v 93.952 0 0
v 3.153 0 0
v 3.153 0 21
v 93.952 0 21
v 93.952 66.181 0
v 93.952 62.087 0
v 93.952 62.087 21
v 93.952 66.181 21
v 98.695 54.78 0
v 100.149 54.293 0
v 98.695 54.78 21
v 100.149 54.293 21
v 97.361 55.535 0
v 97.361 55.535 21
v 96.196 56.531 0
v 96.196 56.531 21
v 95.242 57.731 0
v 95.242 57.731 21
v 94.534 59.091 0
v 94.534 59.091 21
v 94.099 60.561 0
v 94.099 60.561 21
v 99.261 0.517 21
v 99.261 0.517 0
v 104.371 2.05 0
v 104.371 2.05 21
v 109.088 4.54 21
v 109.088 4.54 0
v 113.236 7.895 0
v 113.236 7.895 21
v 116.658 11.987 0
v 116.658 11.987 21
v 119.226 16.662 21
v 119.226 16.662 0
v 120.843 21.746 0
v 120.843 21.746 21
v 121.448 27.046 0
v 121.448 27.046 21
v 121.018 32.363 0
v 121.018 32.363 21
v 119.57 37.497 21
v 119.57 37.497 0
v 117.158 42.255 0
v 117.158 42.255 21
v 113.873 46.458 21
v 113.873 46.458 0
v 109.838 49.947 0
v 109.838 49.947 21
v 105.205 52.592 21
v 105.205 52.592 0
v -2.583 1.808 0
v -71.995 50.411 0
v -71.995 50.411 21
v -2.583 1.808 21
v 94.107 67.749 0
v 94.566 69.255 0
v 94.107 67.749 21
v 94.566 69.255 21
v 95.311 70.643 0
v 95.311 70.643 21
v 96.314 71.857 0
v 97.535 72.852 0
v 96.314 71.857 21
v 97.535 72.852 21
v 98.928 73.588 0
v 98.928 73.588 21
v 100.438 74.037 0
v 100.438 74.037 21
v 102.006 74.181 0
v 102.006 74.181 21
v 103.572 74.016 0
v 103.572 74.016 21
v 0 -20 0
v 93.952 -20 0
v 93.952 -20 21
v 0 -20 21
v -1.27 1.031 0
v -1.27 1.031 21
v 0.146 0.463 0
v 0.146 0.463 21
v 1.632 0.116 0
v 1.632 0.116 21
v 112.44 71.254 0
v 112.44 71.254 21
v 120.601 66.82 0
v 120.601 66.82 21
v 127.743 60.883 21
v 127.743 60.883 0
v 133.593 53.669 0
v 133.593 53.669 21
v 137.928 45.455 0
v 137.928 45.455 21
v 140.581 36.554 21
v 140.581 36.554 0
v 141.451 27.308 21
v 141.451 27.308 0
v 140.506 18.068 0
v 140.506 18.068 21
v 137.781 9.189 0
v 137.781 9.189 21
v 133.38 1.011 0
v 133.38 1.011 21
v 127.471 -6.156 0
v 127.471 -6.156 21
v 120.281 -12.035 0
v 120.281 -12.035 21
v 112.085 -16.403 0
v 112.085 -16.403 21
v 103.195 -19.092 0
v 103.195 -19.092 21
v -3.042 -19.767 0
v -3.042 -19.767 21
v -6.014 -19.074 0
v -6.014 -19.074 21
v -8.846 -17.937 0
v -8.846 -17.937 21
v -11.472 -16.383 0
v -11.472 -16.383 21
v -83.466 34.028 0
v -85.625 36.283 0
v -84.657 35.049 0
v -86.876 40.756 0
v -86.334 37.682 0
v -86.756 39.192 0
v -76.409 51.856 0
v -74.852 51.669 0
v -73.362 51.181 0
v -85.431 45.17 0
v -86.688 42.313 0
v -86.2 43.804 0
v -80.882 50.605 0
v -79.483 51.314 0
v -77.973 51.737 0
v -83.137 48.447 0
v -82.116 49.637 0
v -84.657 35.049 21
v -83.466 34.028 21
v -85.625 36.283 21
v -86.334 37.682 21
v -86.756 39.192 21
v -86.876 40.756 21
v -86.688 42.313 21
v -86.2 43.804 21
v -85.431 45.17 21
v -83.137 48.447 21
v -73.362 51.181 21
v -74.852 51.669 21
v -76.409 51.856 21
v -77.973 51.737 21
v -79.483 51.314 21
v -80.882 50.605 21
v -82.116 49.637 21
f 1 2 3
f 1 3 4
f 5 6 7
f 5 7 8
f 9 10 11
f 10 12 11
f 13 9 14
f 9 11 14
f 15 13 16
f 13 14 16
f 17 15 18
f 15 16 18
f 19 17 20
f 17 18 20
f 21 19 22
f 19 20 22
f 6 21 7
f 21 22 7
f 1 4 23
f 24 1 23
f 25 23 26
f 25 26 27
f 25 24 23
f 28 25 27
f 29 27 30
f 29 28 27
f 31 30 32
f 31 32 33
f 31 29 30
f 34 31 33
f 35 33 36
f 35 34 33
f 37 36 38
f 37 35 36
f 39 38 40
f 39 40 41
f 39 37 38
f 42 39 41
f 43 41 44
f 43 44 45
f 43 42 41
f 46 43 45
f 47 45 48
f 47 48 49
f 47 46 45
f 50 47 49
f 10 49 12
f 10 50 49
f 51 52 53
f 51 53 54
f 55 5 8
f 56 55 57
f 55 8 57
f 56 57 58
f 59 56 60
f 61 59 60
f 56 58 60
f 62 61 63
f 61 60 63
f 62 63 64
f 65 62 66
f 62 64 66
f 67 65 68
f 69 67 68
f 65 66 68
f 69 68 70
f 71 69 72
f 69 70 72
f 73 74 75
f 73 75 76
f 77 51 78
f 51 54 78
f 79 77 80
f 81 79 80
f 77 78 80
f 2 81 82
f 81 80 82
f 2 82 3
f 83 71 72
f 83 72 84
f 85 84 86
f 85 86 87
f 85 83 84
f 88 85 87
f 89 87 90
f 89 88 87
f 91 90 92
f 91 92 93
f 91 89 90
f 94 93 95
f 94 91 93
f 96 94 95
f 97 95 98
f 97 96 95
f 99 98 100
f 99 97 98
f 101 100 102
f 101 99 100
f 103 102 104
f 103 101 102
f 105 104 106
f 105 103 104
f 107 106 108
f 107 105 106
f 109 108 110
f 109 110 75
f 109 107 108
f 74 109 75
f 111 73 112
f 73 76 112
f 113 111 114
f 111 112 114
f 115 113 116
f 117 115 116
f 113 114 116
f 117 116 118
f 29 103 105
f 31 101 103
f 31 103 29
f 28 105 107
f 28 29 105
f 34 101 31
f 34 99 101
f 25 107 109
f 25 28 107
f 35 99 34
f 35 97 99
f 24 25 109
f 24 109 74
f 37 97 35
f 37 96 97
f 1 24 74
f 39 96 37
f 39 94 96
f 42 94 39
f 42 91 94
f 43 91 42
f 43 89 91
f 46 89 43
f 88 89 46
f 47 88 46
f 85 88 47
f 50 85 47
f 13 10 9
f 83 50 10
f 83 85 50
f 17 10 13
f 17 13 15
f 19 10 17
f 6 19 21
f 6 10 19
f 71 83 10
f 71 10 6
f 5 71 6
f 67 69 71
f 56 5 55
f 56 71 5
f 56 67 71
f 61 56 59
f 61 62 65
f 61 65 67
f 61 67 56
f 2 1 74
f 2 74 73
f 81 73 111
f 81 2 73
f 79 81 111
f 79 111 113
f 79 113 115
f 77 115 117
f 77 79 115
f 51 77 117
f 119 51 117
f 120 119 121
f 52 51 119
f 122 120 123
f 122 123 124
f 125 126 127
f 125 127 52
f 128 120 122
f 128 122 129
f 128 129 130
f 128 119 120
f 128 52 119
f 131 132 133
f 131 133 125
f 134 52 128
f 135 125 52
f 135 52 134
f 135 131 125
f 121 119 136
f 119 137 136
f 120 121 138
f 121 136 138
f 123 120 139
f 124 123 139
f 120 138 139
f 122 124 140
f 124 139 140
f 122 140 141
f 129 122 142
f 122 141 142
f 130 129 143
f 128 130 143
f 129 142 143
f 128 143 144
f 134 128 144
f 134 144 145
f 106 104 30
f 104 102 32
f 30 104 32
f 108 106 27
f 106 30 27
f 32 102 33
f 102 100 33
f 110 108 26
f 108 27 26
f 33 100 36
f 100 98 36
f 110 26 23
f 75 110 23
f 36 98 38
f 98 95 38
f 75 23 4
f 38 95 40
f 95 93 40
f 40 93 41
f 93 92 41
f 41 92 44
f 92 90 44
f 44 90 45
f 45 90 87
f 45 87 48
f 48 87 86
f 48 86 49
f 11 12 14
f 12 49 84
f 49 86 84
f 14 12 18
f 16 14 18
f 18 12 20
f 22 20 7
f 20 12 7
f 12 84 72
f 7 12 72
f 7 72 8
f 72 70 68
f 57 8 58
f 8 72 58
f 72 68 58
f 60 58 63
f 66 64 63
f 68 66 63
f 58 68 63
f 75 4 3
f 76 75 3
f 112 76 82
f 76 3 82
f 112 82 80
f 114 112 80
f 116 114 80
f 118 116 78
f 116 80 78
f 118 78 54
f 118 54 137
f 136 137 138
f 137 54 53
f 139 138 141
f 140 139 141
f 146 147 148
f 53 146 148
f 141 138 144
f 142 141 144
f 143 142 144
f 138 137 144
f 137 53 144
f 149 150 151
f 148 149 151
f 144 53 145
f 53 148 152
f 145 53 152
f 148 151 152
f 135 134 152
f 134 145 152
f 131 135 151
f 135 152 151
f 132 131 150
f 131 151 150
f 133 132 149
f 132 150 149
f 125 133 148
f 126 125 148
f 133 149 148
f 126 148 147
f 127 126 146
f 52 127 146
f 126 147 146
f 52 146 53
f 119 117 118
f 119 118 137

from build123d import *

# Parameters (mm, degrees)
BOSS_EXTRU_1_DEPTH = 21
CONG_1_R           = 8
CONG_2_R           = 20
CONG_3_R           = 10


with BuildPart() as part:
    # Esquisse2 → Boss.-Extru.1 (new body)
    with BuildSketch(Plane.XY):
        with BuildLine():
            Line((0, 0), (93.951859629, 0))
            ThreePointArc((93.951859629, 0), (121.451859629, 27.5), (93.951859629, 55))
            Line((93.951859629, 55), (93.951859629, 75))
            ThreePointArc((93.951859629, 75), (141.451859629, 27.5), (93.951859629, -20))
            Line((93.951859629, -20), (-6.305975778, -20))
            Line((-6.305975778, -20), (-90.019669098, 38.616959114))
            Line((-90.019669098, 38.616959114), (-78.548140371, 55))
            Line((-78.548140371, 55), (0, 0))
        make_face()
    extrude(amount=BOSS_EXTRU_1_DEPTH)

    # Congé1
    cong_1_edges = [part.edges().sort_by_distance(p)[0] for p in [
        (93.951859629, 55, 10.5),
        (93.951859629, 75, 10.5),
        (-90.019669098, 38.616959114, 10.5),
        (-78.548140371, 55, 10.5),
    ]]
    fillet(cong_1_edges, radius=CONG_1_R)

    # Congé2
    cong_2_edges = [part.edges().sort_by_distance(p)[0] for p in [
        (-6.305975778, -20, 10.5),
    ]]
    fillet(cong_2_edges, radius=CONG_2_R)

    # Congé3
    cong_3_edges = [part.edges().sort_by_distance(p)[0] for p in [
        (0, 0, 10.5),
    ]]
    fillet(cong_3_edges, radius=CONG_3_R)


solid = part.part
